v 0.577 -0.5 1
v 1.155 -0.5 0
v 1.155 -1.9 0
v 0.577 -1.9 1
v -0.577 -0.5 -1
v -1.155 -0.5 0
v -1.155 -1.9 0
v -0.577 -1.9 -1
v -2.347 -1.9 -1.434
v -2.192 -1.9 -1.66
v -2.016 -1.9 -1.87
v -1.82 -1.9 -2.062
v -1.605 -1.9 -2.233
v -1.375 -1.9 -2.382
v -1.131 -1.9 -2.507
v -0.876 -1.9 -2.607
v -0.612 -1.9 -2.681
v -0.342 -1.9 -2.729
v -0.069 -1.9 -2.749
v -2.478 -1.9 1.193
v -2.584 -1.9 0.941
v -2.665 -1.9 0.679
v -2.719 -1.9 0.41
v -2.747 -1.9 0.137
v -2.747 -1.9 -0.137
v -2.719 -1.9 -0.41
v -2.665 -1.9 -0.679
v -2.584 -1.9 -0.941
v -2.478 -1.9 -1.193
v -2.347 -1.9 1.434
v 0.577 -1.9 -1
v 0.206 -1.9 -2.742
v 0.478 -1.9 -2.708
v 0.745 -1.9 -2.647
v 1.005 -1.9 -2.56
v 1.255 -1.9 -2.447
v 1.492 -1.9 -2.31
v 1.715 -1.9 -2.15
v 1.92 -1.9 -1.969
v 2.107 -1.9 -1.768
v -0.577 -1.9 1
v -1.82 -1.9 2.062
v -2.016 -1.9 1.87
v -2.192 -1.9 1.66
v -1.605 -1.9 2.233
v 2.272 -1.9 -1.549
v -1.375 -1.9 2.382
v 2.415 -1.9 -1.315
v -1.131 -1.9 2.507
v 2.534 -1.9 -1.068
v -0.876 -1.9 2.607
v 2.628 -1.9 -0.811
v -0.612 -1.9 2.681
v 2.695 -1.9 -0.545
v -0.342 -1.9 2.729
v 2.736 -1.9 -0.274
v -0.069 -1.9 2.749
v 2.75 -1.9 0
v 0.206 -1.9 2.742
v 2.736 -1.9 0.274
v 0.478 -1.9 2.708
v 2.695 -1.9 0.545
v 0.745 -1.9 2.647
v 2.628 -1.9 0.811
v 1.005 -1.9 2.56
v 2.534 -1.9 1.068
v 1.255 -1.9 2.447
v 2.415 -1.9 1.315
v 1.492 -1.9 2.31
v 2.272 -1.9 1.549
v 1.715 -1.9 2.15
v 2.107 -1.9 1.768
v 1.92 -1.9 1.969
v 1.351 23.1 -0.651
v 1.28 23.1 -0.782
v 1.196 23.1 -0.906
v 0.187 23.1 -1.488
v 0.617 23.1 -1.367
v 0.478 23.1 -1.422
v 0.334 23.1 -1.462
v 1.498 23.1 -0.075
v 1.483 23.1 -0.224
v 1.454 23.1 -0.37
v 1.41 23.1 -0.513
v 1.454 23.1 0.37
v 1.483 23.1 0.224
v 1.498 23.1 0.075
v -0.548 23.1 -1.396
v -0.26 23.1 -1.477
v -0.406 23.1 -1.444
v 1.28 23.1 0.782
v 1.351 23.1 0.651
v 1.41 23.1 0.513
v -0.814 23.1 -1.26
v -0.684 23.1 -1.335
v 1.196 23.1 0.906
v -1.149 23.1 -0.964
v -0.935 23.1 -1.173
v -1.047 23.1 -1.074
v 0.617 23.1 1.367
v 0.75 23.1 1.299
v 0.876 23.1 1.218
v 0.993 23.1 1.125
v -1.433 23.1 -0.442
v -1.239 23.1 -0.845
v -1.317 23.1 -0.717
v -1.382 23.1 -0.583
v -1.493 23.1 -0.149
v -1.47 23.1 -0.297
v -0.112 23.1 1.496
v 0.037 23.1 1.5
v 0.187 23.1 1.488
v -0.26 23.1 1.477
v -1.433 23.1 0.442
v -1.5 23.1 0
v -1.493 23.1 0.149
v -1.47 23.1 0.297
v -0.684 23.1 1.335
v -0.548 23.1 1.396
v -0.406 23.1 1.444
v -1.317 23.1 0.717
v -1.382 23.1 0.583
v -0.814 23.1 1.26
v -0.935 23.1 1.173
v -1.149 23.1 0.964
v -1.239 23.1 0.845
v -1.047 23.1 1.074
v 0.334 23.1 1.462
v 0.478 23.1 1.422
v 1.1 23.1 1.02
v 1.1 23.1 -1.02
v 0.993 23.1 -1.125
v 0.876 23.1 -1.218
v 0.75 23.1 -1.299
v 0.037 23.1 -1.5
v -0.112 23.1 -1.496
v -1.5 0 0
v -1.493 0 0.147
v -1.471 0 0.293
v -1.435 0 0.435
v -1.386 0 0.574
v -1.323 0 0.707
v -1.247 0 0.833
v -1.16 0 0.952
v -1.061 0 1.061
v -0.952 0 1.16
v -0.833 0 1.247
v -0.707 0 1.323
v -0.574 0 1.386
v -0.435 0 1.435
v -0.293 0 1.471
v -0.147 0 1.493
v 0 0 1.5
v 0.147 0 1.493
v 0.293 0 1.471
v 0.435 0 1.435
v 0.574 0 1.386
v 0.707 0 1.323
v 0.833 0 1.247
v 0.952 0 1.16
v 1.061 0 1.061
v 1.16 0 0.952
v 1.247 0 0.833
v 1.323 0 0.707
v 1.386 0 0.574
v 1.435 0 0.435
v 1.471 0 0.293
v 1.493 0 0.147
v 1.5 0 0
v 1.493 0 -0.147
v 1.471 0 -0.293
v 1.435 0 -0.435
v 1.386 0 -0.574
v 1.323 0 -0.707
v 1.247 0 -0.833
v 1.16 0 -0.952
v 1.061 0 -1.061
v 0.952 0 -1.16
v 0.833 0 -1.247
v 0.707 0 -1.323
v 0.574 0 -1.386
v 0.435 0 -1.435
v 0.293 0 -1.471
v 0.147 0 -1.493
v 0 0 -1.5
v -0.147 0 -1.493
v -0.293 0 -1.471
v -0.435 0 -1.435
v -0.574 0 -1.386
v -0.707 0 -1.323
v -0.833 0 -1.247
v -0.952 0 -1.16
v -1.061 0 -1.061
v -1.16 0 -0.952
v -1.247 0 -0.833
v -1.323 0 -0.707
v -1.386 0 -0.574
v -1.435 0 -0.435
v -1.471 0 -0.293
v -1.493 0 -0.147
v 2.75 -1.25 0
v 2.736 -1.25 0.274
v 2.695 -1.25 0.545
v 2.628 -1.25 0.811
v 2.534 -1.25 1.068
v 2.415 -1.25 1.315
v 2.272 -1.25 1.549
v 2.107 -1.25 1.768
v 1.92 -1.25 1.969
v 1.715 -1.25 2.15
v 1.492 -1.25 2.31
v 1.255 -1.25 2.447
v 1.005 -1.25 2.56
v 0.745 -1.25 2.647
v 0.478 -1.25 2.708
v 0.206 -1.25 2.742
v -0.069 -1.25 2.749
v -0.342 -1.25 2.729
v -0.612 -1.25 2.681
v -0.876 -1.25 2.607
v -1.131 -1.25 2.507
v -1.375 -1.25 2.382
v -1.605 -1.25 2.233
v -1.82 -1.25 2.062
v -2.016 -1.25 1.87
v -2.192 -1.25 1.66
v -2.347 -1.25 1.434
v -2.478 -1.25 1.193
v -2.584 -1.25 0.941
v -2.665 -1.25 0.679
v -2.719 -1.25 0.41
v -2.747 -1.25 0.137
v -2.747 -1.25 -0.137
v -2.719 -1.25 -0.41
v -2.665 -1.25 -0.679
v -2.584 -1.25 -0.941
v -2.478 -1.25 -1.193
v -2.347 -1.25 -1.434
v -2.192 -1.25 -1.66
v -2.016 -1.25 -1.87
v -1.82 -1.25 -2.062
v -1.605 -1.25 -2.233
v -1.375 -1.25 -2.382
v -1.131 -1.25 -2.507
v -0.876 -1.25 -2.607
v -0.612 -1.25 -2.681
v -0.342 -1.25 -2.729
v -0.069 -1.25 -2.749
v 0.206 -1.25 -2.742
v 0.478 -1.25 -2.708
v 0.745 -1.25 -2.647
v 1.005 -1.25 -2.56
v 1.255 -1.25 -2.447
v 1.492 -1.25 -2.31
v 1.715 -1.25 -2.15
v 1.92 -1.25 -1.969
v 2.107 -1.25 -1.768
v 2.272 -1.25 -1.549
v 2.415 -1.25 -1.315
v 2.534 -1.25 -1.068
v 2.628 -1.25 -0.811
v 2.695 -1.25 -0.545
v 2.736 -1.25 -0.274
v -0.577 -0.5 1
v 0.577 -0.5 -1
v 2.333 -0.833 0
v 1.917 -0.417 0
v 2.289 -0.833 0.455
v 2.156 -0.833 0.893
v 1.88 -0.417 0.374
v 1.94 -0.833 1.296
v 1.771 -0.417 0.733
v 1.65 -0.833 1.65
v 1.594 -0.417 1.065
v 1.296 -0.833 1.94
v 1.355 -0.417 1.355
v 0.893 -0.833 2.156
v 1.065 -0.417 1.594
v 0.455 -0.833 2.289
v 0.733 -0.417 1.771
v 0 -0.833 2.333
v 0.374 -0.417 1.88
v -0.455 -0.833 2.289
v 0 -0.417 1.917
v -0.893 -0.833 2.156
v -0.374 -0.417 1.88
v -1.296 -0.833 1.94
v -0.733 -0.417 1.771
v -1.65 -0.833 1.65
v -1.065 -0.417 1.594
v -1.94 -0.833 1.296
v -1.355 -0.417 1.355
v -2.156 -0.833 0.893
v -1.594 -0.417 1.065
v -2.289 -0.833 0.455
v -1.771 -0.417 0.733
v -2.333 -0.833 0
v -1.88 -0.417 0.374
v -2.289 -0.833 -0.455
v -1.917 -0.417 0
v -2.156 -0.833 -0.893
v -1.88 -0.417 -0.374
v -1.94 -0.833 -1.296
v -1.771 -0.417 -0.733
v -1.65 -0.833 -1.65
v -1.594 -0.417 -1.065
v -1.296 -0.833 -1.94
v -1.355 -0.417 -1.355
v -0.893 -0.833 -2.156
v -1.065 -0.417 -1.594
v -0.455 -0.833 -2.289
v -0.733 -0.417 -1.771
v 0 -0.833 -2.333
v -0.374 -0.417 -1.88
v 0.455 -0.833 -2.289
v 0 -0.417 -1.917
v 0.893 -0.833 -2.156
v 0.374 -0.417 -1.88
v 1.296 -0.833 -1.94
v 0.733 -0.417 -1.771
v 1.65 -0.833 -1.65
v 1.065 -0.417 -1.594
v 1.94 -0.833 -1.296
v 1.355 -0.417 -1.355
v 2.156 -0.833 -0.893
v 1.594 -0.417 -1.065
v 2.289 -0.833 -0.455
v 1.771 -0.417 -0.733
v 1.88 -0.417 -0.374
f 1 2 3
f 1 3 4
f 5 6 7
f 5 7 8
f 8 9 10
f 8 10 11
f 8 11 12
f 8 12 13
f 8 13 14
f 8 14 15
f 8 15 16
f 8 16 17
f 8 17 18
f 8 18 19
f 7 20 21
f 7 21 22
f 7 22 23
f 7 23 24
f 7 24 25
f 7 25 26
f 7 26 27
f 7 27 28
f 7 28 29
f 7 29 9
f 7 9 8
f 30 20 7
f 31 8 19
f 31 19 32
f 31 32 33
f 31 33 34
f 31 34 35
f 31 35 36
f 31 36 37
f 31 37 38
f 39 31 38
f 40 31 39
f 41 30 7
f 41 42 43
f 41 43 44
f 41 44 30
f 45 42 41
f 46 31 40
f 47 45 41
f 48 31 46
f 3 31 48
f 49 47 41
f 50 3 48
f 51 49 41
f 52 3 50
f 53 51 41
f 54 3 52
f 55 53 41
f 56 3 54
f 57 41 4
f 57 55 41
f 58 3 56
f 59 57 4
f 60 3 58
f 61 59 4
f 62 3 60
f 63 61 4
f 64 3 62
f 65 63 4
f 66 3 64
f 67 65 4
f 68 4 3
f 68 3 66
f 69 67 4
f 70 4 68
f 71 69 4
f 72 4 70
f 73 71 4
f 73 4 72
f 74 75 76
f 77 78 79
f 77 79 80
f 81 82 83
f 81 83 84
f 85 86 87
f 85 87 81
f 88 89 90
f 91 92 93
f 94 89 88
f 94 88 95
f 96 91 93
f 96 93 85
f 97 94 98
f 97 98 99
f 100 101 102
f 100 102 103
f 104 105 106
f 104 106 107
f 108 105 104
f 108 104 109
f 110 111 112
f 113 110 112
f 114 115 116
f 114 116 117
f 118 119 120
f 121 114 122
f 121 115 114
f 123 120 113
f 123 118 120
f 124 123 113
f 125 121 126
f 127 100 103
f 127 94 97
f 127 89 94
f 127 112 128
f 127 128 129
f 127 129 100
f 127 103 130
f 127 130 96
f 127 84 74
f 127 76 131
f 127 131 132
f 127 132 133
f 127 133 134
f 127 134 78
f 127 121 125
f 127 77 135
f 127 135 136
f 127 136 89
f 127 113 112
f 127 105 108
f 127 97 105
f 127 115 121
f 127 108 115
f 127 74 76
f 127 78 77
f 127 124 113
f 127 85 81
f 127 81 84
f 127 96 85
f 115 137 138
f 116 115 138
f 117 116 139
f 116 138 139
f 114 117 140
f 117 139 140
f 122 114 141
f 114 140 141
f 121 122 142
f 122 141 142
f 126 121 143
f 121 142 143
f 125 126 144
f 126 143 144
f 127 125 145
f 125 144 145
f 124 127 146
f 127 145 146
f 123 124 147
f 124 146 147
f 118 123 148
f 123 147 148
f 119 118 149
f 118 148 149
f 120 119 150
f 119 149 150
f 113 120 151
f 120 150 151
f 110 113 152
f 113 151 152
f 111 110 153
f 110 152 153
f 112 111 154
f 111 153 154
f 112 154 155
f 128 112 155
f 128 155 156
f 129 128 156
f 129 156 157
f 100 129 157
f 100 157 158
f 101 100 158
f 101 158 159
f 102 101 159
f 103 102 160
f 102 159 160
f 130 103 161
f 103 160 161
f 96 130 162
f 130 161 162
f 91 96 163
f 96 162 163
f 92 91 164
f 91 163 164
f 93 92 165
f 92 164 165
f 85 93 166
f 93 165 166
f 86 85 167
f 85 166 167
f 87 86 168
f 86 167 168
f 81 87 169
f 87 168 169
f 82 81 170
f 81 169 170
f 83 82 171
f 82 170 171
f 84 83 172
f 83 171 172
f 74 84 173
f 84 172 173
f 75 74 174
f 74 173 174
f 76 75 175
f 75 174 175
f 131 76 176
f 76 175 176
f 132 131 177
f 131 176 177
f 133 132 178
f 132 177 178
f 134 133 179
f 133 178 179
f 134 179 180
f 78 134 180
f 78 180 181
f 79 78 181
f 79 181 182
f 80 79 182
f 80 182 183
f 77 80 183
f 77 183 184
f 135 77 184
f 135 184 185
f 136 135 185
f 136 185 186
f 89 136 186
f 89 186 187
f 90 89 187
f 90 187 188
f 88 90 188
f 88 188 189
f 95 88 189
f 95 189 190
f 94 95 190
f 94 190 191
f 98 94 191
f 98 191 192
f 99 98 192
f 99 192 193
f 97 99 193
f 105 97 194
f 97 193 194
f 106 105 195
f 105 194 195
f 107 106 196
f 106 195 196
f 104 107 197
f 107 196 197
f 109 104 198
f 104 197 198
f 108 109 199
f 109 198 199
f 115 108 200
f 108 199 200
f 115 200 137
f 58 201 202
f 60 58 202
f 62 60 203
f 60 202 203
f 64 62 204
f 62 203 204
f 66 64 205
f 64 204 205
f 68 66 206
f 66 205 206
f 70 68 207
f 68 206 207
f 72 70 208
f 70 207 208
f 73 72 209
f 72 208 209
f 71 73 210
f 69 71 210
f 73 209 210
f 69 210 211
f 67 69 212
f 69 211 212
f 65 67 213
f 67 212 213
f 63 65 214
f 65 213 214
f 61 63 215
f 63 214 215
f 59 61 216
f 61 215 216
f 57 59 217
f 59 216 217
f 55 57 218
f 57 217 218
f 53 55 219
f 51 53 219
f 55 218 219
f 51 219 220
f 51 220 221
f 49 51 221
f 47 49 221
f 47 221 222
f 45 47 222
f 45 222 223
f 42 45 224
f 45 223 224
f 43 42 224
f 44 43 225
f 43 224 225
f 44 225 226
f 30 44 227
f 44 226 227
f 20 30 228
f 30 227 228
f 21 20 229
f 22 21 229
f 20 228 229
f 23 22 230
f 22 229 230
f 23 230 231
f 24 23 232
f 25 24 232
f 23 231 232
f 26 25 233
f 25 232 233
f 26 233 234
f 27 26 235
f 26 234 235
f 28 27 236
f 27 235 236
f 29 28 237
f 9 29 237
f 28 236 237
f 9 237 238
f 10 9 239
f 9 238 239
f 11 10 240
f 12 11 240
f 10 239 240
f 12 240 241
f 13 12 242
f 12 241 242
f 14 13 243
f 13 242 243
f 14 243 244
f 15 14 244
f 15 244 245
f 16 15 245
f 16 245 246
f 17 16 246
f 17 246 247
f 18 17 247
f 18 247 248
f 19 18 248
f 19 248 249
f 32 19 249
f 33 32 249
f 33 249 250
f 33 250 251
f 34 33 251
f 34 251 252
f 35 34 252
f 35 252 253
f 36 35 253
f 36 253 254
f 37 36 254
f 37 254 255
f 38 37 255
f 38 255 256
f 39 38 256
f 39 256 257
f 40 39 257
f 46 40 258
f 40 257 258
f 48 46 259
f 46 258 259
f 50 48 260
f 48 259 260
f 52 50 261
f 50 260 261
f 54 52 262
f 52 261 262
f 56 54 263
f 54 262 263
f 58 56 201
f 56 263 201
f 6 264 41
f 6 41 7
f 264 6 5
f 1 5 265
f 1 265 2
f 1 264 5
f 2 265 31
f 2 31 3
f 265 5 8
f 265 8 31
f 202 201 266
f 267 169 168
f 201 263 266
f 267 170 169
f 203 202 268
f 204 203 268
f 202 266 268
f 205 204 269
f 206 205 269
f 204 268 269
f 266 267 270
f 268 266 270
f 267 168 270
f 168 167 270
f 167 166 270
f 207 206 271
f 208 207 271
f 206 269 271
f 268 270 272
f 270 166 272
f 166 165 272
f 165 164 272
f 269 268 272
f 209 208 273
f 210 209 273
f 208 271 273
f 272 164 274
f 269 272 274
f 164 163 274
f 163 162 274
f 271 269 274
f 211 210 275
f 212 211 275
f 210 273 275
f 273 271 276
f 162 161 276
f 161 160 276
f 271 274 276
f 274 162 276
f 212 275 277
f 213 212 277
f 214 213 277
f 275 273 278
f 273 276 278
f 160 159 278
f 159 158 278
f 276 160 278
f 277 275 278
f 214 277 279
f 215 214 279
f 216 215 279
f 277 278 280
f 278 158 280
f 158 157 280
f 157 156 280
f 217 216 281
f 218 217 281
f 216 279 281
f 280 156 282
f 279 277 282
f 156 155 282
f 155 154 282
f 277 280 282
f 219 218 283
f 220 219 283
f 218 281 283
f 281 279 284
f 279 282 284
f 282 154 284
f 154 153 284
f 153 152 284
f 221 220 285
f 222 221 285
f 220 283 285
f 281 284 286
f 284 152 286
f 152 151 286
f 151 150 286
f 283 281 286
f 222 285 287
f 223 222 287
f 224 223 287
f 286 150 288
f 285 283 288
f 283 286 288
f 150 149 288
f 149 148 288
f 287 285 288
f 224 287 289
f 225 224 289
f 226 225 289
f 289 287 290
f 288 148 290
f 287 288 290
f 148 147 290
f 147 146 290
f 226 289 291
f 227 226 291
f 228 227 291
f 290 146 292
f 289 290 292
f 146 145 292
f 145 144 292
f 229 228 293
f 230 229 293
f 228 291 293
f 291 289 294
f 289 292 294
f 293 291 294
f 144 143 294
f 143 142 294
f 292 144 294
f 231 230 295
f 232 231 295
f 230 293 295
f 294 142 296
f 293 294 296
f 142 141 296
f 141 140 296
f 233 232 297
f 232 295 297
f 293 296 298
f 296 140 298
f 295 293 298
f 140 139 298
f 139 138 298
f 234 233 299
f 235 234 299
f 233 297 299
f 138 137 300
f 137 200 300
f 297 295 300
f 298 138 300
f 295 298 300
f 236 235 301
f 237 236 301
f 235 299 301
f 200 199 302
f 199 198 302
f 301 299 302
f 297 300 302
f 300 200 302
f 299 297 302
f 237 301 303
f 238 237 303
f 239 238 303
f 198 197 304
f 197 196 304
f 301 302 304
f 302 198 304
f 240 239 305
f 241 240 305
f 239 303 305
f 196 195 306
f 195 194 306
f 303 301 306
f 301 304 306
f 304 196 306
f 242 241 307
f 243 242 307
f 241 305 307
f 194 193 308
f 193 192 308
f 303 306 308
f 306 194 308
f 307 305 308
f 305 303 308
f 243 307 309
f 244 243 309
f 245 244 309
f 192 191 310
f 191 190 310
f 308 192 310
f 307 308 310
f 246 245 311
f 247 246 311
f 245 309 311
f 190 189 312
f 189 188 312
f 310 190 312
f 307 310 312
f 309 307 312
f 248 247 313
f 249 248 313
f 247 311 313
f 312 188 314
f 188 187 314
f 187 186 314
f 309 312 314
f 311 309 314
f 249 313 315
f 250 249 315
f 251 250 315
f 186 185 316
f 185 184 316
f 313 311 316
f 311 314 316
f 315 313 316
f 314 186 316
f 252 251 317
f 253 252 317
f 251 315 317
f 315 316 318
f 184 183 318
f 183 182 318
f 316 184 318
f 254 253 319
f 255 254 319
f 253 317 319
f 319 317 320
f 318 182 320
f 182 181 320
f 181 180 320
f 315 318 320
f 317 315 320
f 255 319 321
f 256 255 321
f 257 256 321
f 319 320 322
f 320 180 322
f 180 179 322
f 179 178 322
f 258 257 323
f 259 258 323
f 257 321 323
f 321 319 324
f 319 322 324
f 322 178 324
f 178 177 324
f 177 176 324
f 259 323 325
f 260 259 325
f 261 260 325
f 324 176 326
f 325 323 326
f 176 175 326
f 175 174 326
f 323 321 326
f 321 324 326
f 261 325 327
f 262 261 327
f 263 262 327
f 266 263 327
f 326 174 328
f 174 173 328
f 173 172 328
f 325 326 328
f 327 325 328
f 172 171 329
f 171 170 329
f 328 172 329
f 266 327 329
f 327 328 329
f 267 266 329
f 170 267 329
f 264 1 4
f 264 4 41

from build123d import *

# Parameters (mm, degrees)
F0_R     = 2.75
F1_DEPTH = 1.9
F2_R     = 1.5
F3_DEPTH = 23.1
F5_START = 0.5
F5_DEPTH = 4.5
F6_SIZE2 = 1.24999
F6_SIZE  = 1.24999


# Not quite as in the source:
# - a fillet or chamfer is up to 0.001 mm smaller than in the source, because OpenCascade refuses the exact size


with BuildPart() as f1:
    # F0 (on Front) → F1 (new body)
    with BuildSketch(Plane.XZ):
        Circle(F0_R)
    extrude(amount=F1_DEPTH)

    # F2 (on face) → F3 (join)
    with BuildSketch(Plane(origin=(0, 0, 0), x_dir=(-1, 0, 0), z_dir=(0, 1, 0))):
        Circle(F2_R)
    extrude(amount=F3_DEPTH)

    # F4 (on Front) → F5 (cut)
    with BuildSketch(Plane.XZ.offset(F5_START)):
        Polygon((1.1547005384, 0), (0.5773502692, 1), (-0.5773502692, 1), (-1.1547005384, 0), (-0.5773502692, -1), (0.5773502692, -1), align=None)
    extrude(amount=F5_DEPTH, mode=Mode.SUBTRACT)

    # F6 (size 1.25 and 1.25 in the source; OpenCascade refuses exactly that, so slightly less here)
    f6_edges = [f1.edges().sort_by_distance(p)[0] for p in [
        (-2.75, 0, 0),
    ]]
    chamfer(f6_edges, length=F6_SIZE, length2=F6_SIZE2)


solid = f1.part
